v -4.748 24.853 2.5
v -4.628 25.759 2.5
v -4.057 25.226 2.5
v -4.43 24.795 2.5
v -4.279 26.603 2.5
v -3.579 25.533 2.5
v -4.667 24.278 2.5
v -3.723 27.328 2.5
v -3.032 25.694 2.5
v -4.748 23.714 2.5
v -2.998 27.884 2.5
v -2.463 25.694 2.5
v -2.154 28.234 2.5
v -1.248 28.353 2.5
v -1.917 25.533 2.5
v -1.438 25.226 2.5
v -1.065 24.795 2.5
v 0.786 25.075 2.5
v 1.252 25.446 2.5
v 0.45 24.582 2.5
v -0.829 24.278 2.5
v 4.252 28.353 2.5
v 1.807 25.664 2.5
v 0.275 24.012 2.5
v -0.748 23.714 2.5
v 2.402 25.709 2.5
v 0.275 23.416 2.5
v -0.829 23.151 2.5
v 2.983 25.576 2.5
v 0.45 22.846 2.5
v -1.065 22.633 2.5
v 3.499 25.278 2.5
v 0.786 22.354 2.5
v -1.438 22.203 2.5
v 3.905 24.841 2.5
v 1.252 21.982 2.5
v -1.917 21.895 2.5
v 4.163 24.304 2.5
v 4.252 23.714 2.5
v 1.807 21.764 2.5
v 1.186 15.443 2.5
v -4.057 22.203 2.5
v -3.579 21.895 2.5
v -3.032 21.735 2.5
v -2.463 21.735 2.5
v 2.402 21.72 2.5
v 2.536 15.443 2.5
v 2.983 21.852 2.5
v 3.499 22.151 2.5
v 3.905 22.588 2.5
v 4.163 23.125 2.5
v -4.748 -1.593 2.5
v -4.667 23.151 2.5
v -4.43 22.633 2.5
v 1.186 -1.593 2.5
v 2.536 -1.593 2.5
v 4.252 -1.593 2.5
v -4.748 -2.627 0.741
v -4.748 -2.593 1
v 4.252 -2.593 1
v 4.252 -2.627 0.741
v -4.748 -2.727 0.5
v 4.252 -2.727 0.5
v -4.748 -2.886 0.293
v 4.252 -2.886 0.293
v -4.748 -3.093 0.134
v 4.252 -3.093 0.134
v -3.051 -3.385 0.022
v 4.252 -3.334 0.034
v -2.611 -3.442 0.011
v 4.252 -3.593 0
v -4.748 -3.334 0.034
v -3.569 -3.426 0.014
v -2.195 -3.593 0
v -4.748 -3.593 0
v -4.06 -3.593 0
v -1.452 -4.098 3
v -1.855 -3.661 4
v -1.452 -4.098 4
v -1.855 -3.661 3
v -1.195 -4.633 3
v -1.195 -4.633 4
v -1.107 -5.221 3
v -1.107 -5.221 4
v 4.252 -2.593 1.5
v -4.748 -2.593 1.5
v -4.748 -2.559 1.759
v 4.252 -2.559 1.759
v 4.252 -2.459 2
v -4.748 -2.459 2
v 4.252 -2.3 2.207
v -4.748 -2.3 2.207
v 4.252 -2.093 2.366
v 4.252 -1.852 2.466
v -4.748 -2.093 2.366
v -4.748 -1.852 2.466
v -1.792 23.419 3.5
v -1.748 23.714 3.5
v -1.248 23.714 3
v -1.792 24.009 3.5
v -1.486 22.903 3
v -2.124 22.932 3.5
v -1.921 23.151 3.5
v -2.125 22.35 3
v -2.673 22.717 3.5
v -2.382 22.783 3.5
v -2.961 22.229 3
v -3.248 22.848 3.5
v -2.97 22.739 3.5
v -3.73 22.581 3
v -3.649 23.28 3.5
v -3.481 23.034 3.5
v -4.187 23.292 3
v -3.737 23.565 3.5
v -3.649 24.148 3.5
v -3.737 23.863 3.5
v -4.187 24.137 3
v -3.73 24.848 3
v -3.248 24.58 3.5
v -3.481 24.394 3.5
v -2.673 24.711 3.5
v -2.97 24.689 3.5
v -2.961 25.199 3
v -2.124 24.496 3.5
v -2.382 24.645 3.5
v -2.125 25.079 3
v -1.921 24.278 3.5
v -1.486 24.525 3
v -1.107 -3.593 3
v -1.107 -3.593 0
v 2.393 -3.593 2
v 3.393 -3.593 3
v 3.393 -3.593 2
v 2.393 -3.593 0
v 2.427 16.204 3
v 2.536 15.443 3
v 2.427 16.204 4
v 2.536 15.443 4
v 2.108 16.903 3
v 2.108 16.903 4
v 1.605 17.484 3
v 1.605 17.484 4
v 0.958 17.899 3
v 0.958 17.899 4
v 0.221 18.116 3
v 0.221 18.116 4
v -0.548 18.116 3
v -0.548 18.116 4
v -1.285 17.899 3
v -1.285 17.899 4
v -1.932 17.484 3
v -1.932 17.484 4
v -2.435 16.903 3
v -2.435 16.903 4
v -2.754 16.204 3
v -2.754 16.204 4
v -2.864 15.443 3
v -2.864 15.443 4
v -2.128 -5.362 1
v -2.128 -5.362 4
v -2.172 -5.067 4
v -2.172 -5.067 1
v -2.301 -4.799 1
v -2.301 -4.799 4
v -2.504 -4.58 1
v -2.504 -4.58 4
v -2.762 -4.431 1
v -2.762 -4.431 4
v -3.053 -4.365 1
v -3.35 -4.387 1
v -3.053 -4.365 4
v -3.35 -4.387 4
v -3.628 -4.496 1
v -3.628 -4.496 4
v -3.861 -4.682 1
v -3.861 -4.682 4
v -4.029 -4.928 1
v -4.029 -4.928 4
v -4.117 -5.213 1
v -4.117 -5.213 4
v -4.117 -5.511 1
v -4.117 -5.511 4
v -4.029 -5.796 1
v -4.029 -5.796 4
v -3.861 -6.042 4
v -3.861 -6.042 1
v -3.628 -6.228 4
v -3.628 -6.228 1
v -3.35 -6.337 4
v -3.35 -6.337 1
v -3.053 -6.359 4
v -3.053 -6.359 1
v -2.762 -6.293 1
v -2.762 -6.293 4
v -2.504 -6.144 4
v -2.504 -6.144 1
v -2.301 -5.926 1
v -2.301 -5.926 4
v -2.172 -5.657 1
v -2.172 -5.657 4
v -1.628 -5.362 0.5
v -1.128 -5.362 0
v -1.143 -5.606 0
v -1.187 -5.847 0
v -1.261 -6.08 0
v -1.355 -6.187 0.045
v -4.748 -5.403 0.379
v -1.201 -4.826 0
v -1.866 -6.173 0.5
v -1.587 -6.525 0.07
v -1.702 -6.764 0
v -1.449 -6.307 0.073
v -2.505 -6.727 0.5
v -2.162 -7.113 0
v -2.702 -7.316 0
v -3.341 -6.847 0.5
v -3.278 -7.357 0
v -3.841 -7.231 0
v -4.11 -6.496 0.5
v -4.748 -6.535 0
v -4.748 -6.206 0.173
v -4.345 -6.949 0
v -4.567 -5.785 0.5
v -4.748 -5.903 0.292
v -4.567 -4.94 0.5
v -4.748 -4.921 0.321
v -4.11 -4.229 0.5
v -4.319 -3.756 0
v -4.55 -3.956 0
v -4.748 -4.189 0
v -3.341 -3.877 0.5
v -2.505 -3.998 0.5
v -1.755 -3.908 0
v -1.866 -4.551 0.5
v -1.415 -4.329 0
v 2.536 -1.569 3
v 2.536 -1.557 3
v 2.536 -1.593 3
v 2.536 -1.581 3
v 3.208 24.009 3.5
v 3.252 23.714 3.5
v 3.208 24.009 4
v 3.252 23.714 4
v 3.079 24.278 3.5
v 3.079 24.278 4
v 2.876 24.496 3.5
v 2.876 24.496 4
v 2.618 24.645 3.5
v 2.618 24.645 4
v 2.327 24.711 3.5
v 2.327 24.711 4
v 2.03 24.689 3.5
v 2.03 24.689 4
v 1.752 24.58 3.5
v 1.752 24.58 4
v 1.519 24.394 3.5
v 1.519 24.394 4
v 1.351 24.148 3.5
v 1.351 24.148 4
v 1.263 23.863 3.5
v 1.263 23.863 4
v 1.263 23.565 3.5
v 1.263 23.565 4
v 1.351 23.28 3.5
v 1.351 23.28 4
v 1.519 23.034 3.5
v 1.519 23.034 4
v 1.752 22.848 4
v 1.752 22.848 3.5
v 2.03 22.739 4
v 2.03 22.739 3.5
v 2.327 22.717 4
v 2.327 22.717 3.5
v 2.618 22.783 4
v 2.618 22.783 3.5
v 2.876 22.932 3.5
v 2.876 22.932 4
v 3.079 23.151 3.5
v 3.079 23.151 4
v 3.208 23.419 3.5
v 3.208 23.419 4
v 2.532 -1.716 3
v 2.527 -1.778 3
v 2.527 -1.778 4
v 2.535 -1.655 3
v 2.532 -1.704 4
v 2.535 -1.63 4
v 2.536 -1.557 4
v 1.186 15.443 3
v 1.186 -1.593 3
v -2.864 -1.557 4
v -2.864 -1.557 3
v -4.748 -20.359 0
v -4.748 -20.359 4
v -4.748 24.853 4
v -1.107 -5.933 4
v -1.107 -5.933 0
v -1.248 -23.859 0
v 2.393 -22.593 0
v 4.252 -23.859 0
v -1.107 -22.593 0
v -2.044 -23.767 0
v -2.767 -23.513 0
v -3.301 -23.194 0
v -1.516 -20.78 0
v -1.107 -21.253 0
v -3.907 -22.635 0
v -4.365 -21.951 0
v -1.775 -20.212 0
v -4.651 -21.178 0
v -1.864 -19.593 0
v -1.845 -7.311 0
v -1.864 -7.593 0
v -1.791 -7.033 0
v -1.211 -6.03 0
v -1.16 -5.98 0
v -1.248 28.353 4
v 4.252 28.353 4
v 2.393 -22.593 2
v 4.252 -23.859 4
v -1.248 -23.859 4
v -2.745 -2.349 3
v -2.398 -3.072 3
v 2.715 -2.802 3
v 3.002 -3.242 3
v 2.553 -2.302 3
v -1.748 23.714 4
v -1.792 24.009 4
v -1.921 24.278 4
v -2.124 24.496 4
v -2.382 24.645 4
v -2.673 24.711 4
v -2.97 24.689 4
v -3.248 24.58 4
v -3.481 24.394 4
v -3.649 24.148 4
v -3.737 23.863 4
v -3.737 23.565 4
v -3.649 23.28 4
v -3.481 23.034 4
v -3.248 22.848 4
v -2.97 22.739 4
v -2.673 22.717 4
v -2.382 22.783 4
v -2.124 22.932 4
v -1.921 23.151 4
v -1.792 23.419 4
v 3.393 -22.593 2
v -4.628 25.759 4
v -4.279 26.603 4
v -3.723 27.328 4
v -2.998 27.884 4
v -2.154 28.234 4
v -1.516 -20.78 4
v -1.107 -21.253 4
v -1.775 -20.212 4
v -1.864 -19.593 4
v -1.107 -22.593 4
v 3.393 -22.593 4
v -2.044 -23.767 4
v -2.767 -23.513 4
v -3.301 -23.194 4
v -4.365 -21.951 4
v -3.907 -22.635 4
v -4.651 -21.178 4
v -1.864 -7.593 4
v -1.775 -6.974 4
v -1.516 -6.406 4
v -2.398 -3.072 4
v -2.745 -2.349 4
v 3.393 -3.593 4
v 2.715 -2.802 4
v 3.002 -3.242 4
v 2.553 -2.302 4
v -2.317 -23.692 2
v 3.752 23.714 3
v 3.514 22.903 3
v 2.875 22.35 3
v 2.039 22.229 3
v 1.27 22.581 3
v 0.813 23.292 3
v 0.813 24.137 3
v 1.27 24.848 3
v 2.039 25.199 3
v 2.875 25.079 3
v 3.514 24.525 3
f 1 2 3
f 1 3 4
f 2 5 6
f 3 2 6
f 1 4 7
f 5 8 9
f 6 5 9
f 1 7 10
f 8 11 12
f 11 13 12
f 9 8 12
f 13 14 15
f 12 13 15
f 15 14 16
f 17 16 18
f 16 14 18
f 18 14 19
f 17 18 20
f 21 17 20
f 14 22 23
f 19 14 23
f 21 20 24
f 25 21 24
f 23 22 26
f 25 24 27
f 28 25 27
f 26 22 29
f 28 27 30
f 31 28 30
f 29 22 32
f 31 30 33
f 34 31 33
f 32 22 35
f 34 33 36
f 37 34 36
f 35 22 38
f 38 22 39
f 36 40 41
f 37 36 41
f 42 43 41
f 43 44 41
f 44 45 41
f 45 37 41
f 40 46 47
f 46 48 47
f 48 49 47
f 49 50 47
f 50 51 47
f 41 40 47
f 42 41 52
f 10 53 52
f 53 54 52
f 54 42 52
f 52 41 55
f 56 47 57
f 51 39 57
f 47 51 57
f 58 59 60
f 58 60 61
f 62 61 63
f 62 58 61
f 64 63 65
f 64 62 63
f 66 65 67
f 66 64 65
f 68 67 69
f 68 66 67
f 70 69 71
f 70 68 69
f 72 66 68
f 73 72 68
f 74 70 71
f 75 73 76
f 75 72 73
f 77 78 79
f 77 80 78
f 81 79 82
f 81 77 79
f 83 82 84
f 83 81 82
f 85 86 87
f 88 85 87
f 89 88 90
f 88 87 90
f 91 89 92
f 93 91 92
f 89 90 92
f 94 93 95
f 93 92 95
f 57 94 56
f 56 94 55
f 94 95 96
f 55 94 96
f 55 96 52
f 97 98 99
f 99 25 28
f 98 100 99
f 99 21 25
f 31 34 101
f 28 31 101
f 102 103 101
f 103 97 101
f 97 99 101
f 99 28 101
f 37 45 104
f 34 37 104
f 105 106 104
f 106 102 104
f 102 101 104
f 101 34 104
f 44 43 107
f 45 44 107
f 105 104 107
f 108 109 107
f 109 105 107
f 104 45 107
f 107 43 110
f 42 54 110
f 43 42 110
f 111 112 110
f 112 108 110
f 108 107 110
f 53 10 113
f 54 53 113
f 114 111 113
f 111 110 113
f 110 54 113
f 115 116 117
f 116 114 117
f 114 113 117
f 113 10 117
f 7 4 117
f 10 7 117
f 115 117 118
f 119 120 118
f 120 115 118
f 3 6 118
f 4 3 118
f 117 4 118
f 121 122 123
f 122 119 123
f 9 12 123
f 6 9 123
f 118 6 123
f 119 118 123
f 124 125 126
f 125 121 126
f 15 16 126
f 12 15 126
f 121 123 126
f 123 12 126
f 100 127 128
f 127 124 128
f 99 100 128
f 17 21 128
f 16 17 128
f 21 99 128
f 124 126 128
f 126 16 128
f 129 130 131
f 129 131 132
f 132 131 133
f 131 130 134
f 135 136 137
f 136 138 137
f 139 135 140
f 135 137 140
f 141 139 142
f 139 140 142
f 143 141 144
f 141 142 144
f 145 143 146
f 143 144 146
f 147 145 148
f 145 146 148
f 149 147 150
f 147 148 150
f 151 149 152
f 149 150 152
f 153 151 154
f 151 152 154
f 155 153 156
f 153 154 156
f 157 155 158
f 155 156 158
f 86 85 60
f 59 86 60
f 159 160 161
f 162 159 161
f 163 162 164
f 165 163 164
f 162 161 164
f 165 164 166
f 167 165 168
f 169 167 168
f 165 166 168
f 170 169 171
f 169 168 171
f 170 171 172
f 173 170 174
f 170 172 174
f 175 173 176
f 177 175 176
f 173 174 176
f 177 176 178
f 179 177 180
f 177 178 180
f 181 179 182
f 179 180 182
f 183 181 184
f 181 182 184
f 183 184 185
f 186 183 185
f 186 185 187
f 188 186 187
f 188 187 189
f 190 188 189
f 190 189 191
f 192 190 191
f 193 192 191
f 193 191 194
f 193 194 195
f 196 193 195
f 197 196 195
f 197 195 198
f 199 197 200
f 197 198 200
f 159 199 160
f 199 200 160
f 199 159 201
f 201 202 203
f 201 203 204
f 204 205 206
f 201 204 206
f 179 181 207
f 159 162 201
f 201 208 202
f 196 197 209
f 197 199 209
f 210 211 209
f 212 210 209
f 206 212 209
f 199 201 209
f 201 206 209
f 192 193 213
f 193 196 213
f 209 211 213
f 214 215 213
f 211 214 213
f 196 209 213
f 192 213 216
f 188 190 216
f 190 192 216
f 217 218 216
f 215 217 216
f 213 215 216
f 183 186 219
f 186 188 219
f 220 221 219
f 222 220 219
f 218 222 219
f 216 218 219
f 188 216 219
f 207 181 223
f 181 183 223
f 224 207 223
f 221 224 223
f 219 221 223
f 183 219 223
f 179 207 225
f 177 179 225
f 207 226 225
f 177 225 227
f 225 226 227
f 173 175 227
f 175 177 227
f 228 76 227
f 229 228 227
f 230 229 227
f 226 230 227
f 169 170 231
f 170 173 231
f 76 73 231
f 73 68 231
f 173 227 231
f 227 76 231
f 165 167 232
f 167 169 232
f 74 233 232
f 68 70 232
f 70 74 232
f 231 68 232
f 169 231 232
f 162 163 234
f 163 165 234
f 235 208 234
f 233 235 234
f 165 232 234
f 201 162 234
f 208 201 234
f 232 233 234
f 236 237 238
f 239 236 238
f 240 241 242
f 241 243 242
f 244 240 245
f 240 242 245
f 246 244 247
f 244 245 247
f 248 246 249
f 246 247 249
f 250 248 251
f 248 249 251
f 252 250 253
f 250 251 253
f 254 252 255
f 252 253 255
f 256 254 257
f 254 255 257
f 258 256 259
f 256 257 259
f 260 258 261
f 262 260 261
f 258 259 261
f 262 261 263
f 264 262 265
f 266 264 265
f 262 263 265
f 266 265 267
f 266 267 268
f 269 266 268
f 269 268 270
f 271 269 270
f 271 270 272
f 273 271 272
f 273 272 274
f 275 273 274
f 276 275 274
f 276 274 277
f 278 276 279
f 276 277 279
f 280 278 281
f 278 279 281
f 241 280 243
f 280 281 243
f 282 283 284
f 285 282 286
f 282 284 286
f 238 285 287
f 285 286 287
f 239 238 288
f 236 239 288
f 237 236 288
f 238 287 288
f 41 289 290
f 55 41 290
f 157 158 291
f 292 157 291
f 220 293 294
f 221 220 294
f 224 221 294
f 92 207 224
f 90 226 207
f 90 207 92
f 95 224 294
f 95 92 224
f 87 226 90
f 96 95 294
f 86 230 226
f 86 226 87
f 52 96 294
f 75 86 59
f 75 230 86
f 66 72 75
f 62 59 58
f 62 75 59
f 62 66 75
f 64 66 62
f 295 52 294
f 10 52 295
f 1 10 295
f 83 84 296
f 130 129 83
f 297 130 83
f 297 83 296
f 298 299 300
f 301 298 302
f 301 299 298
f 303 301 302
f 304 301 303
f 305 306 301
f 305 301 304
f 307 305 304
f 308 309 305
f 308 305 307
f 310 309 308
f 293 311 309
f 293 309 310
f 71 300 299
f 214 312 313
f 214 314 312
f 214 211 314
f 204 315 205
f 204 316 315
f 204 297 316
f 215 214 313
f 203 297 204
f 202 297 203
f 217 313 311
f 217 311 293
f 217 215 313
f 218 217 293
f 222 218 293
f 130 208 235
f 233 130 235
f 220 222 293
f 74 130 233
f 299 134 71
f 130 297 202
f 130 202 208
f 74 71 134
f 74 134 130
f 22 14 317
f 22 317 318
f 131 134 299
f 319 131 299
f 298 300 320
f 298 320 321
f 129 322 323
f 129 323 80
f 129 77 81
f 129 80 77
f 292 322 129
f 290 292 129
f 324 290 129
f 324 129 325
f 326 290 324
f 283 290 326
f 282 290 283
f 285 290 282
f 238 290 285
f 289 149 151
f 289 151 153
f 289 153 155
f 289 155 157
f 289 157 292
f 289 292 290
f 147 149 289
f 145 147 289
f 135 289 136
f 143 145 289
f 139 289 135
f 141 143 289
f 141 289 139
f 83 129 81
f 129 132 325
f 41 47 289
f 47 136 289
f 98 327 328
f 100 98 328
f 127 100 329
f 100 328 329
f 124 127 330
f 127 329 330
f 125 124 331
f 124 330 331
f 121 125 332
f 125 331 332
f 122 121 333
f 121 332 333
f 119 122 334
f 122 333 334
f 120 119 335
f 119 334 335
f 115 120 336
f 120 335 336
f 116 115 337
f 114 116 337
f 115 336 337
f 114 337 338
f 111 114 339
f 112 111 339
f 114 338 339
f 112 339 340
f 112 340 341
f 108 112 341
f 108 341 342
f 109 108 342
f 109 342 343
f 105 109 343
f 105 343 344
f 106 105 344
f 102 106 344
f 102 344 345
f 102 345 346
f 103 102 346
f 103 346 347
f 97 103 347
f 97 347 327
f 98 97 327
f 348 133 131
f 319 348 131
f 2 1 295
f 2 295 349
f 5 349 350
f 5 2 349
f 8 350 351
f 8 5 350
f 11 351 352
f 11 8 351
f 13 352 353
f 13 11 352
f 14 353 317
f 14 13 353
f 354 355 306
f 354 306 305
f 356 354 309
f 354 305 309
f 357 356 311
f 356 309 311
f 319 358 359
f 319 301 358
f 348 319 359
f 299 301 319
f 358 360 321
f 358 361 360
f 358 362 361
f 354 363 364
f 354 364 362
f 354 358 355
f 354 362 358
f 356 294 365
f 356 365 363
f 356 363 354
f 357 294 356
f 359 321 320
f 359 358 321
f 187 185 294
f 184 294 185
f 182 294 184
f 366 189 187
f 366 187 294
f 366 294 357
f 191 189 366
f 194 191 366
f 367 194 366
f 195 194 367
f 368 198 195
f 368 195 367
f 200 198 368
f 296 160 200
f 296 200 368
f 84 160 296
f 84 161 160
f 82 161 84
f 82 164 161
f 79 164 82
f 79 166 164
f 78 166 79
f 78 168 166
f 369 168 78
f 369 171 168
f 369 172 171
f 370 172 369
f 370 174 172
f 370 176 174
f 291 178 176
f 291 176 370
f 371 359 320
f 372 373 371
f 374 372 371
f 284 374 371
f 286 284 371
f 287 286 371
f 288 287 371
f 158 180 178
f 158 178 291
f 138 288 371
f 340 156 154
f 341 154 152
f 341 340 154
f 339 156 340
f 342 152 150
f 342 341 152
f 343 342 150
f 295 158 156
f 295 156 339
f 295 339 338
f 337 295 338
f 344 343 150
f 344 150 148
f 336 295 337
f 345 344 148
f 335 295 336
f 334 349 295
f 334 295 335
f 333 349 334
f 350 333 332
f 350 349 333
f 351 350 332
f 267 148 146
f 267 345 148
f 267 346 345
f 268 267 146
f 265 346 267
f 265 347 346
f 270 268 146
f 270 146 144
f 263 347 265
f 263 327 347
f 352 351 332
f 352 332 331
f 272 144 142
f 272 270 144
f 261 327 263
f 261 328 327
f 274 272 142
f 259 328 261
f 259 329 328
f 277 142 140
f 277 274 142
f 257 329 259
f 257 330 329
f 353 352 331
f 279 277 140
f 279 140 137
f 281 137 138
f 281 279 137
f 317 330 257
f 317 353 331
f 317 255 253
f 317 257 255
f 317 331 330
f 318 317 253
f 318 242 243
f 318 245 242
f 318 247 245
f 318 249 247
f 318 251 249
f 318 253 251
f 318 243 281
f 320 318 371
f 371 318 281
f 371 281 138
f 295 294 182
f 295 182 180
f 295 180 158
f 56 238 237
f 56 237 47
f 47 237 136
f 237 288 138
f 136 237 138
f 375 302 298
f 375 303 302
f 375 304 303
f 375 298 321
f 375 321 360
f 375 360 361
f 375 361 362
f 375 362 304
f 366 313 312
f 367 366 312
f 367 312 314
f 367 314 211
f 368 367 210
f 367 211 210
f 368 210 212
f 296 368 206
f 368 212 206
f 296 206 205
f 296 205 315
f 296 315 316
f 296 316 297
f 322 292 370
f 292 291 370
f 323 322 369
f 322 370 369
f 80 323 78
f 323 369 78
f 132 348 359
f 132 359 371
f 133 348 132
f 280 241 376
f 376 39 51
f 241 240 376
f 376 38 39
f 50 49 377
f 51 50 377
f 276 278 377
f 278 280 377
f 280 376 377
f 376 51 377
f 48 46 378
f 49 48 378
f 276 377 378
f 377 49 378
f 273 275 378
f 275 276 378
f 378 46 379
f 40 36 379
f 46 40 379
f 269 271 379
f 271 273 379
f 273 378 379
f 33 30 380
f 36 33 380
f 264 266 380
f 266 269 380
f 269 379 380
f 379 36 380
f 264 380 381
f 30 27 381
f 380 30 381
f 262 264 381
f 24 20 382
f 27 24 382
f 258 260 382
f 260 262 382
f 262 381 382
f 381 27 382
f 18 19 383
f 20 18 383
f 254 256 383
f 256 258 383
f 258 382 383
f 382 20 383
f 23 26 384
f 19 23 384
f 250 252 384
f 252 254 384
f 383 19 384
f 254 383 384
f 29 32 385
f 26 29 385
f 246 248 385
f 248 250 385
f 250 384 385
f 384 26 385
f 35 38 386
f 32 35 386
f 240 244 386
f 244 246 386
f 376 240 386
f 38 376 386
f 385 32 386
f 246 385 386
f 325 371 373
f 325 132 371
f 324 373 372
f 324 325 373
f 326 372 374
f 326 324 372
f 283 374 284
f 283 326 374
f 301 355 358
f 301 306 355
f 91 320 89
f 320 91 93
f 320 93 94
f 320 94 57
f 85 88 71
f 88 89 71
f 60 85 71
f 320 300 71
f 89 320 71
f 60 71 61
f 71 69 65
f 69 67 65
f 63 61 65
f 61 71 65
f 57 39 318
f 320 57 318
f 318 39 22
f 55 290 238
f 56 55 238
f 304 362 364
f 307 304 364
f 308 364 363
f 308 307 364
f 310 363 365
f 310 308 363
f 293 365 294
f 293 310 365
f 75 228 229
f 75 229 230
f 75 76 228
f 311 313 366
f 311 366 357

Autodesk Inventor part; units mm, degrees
ref_plane "YZ Plane" through (0, 0, 0) normal (1, 0, 0) x (0, 1, 0)
ref_plane "XZ Plane" through (0, 0, 0) normal (0, 1, 0) x (-1, 0, 0)
ref_plane "XY Plane" through (0, 0, 0) normal (0, 0, 1) x (1, 0, 0)
sketch "草图1" plane through (0, 0, 0) normal (0, 0, 1) x (1, 0, 0)
  point P0 (0, 0)
sketch "草图2" plane through (0, 0, 0) normal (0, 0, 1) x (1, 0, 0)
  arc A0 (-0.8636, -19.593) -> (1.5364, -19.593) centre (0.3364, -19.593) ccw
  line L0 (-0.8636, -19.593) -> (-0.8636, -7.593)
  arc A1 (1.5364, -7.593) -> (-0.8636, -7.593) centre (0.3364, -7.593) ccw
  line L1 (1.5364, -7.593) -> (1.5364, -19.593)
  arc A2 (-1.8636, -1.5566) -> (1.5364, -1.5566) centre (-0.1636, -1.5566) ccw
  line L2 (-1.8636, 15.4434) -> (-1.8636, -1.5566)
  arc A3 (1.5364, 15.4434) -> (-1.8636, 15.4434) centre (-0.1636, 15.4434) ccw
  line L3 (1.5364, 8.4451) -> (1.5364, 15.4434)
  arc A4 (1.3364, 8.2451) -> (1.5364, 8.4451) centre (1.3364, 8.4451) ccw
  line L4 (1.3364, 8.2451) -> (1.2785, 8.2451)
  arc A5 (1.0785, 8.4451) -> (1.2785, 8.2451) centre (1.2785, 8.4451) ccw
  line L5 (1.0785, 8.4451) -> (1.0785, 15.3461)
  arc A6 (1.0785, 15.3461) -> (-1.3205, 15.3461) centre (-0.121, 15.3461) ccw
  line L6 (-1.3205, 15.3461) -> (-1.3205, -1.4976)
  arc A7 (-1.3205, -1.4976) -> (1.0785, -1.4976) centre (-0.121, -1.4976) ccw
  line L7 (1.0785, -1.4976) -> (1.0785, 5.4033)
  arc A8 (1.2785, 5.6033) -> (1.0785, 5.4033) centre (1.2785, 5.4033) ccw
  line L8 (1.2785, 5.6033) -> (1.3364, 5.6033)
  arc A9 (1.5364, 5.4033) -> (1.3364, 5.6033) centre (1.3364, 5.4033) ccw
  line L9 (1.5364, -1.5566) -> (1.5364, 5.4033)
  arc A10 (-4.7477, -20.3592) -> (-3.3007, -23.1939) centre (-1.2477, -20.3592) ccw
  spline S0 degree 3 poles (-1.2477, -23.8592) (-1.6067, -23.8592) (-1.9735, -23.8009) (-2.735, -23.5583) (-3.0595, -23.3686) (-3.3007, -23.1939) knots 0 0 0 0 0.450925 0.450925 1 1 1 1
  line L10 (5.2523, -23.8592) -> (-1.2477, -23.8592)
  line L11 (5.2523, 28.3531) -> (5.2523, -23.8592)
  line L12 (-1.2477, 28.3531) -> (5.2523, 28.3531)
  arc A11 (-1.2477, 28.3531) -> (-4.7477, 24.8531) centre (-1.2477, 24.8531) ccw
  line L13 (-4.7477, -20.3592) -> (-4.7477, 24.8531)
  line L14 (4.2523, -23.8592) -> (4.2523, 28.3531)
  line L15 (5.2523, 28.3531) -> (4.2523, 28.3531)
  line L16 (5.2523, -23.8592) -> (5.2523, 28.3531)
  line L17 (4.2523, -23.8592) -> (5.2523, -23.8592)
  point P0 (0, 0)
extrude "拉伸1" add sketch "草图2" along normal blind 4 contours L0 A1 L1 A0 | L2 A3 L3 A4 L4 A5 L5 A6 L6 A7 L7 A8 L8 A9 L9 A2 | L13 A11 L12 L14 L10 S0 A10
sketch "草图3" plane through (0, 0, 4) normal (0, 0, 1) x (1, 0, 0)
  point P0 (0, 0)
sketch "草图4" plane through (0, 0, 0) normal (0, 0, -1) x (-1, 0, 0)
  line L0 (-3.3928, -22.593) -> (-3.3928, -3.4829)
  line L1 (-3.3928, -3.4829) -> (-4.2523, -3.4829)
  line L2 (-4.2523, -3.4829) -> (-4.2523, -23.8592)
  line L3 (-4.2523, -23.8592) -> (1.2477, -23.8592)
  spline S0 degree 3 poles (1.2477, -23.8592) (1.6878, -23.8592) (2.1571, -23.7712) (2.6422, -23.5699) (2.6953, -23.5463) (2.7477, -23.5215) knots 0 0 0 0 0.889543 0.889543 1 1 1 1
  line L4 (2.7477, -23.5215) -> (2.7477, -3.4829)
  line L5 (2.7477, -3.4829) -> (1.1072, -3.4829)
  line L6 (1.1072, -3.4829) -> (1.1072, -5.9329)
  arc A0 (1.8636, -7.593) -> (1.1072, -5.9329) centre (-0.3364, -7.593) ccw
  line L7 (1.8636, -7.593) -> (1.8636, -19.593)
  arc A1 (1.1072, -21.2531) -> (1.8636, -19.593) centre (-0.3364, -19.593) ccw
  line L8 (1.1072, -21.2531) -> (1.1072, -22.593)
  line L9 (1.1072, -22.593) -> (-3.3928, -22.593)
  line L10 (1.1072, -3.593) -> (-3.3928, -3.593)
  point P0 (0, 0)
extrude "拉伸2" cut sketch "草图4" against normal blind 4 contours L0 L10 L6 A0 L7 A1 L8 L9
sketch "草图5" plane through (0, 0, 0) normal (0, 0, -1) x (-1, 0, 0)
  line L0 (-2.3928, -3.593) -> (-2.3928, -22.593) projected
  line L1 (-2.3928, -3.593) -> (-3.3928, -3.593) projected
  line L2 (-3.3928, -22.593) -> (-3.3928, -3.593) projected
  line L3 (-2.3928, -22.593) -> (-3.3928, -22.593) projected
  point P0 (0, 0)
extrude "拉伸3" add sketch "草图5" against normal blind 2
sketch "草图6" plane through (4.2523, -23.8592, 0) normal (1, 0, 0) x (0, 0, -1)
  line L0 (0.0883, 54.0026) -> (-2.5, 54.0026)
  line L1 (-2.5, 54.0026) -> (-2.5, 21.2662)
  line L2 (-2.5, 21.2662) -> (0.0883, 21.2662)
  line L3 (0.0883, 21.2662) -> (0.0883, 54.0026)
  line L4 (1, 20.2662) -> (-3, 20.2662) projected
  line L5 (-4, 0) -> (-4, 52.2123) projected
  point P0 (0, 23.8592)
  point P1 (-1, 20.2662)
  dimension "d6" = 1
  dimension "d7" = 1.5
extrude "拉伸4" cut sketch "草图6" against normal blind 33
fillet "圆角1" radius 1 2 edges at (-0.2477, -2.593, 2.5) (-0.2477, -2.593, 0)
sketch "草图7" plane through (0, 0, 4) normal (0, 0, 1) x (1, 0, 0)
  arc A0 (-1.8636, -1.5566) -> (1.5364, -1.5566) centre (-0.1636, -1.5566) ccw projected
  line L0 (-1.8636, 15.4434) -> (-1.8636, -1.5566) projected
  line L1 (1.5364, -1.5566) -> (1.5364, 5.4033) projected
  line L2 (1.379, -1.5758) -> (1.379, 15.4242) projected
  arc A1 (1.5364, 15.4434) -> (-1.8636, 15.4434) centre (-0.1636, 15.4434) ccw projected
  line L3 (1.5364, -1.5566) -> (1.5364, 15.4434) projected
  line L4 (-2.8636, 15.4434) -> (-2.8636, -1.5566)
  arc A2 (-2.8636, -1.5566) -> (2.5364, -1.5566) centre (-0.1636, -1.5566) ccw
  line L5 (2.5364, -1.5566) -> (2.5364, 15.4434)
  arc A3 (2.5364, 15.4434) -> (-2.8636, 15.4434) centre (-0.1636, 15.4434) ccw
  point P0 (0, 0)
  dimension "d11" = 1
extrude "拉伸5" cut sketch "草图7" against normal blind 1 contours L0 A1 L3 L1 A0 | A3 L5 A2 L4
fillet "圆角2" radius 2 2 edges at (-1.1072, -4.0864, 3.5) (1.6093, -3.593, 3.5)
sketch "草图8" plane through (0, 0, 3) normal (0, 0, 1) x (1, 0, 0)
  arc A0 (2.5364, 15.4434) -> (-2.8636, 15.4434) centre (-0.1636, 15.4434) ccw projected
  line L0 (2.5364, 15.4434) -> (1.1862, 15.4434)
  line L1 (1.1862, 15.4434) -> (1.1862, -1.593)
  line L2 (1.1862, -1.593) -> (2.5364, -1.593)
  line L3 (2.5364, -1.593) -> (2.5364, 15.4434)
  line L4 (-4.7477, -1.593) -> (4.2523, -1.593) projected
  point P0 (0, 0)
extrude "拉伸6" cut sketch "草图8" against normal blind 1
sketch "草图9" plane through (0, 0, 4) normal (0, 0, 1) x (1, 0, 0)
  point P0 (0, 0)
sketch "草图10" plane through (0, 0, 4) normal (0, 0, 1) x (1, 0, 0)
  circle A0 centre (-2.7477, 23.7142) radius 1
  circle A1 centre (2.2523, 23.7142) radius 1
  line L0 (4.2523, -23.8592) -> (4.2523, 28.3531) projected
  line L1 (-4.7477, 24.8531) -> (-4.7477, -20.3592) projected
  circle A2 centre (-3.1277, -5.3622) radius 1
  point P0 (0, 0)
  dimension "d17" = 2
  dimension "d18" = 2
  dimension "d19" = 2
  dimension "d20" = 2
  dimension "d21" = 2
extrude "拉伸7" cut sketch "草图10" against normal blind 9.5
chamfer "倒角1" distance 1 angle 45 3 edges at (-3.7477, 23.7142, 2.5) (1.2523, 23.7142, 2.5) (-4.1277, -5.3622, 0)
properties part number "指纹安装板"
